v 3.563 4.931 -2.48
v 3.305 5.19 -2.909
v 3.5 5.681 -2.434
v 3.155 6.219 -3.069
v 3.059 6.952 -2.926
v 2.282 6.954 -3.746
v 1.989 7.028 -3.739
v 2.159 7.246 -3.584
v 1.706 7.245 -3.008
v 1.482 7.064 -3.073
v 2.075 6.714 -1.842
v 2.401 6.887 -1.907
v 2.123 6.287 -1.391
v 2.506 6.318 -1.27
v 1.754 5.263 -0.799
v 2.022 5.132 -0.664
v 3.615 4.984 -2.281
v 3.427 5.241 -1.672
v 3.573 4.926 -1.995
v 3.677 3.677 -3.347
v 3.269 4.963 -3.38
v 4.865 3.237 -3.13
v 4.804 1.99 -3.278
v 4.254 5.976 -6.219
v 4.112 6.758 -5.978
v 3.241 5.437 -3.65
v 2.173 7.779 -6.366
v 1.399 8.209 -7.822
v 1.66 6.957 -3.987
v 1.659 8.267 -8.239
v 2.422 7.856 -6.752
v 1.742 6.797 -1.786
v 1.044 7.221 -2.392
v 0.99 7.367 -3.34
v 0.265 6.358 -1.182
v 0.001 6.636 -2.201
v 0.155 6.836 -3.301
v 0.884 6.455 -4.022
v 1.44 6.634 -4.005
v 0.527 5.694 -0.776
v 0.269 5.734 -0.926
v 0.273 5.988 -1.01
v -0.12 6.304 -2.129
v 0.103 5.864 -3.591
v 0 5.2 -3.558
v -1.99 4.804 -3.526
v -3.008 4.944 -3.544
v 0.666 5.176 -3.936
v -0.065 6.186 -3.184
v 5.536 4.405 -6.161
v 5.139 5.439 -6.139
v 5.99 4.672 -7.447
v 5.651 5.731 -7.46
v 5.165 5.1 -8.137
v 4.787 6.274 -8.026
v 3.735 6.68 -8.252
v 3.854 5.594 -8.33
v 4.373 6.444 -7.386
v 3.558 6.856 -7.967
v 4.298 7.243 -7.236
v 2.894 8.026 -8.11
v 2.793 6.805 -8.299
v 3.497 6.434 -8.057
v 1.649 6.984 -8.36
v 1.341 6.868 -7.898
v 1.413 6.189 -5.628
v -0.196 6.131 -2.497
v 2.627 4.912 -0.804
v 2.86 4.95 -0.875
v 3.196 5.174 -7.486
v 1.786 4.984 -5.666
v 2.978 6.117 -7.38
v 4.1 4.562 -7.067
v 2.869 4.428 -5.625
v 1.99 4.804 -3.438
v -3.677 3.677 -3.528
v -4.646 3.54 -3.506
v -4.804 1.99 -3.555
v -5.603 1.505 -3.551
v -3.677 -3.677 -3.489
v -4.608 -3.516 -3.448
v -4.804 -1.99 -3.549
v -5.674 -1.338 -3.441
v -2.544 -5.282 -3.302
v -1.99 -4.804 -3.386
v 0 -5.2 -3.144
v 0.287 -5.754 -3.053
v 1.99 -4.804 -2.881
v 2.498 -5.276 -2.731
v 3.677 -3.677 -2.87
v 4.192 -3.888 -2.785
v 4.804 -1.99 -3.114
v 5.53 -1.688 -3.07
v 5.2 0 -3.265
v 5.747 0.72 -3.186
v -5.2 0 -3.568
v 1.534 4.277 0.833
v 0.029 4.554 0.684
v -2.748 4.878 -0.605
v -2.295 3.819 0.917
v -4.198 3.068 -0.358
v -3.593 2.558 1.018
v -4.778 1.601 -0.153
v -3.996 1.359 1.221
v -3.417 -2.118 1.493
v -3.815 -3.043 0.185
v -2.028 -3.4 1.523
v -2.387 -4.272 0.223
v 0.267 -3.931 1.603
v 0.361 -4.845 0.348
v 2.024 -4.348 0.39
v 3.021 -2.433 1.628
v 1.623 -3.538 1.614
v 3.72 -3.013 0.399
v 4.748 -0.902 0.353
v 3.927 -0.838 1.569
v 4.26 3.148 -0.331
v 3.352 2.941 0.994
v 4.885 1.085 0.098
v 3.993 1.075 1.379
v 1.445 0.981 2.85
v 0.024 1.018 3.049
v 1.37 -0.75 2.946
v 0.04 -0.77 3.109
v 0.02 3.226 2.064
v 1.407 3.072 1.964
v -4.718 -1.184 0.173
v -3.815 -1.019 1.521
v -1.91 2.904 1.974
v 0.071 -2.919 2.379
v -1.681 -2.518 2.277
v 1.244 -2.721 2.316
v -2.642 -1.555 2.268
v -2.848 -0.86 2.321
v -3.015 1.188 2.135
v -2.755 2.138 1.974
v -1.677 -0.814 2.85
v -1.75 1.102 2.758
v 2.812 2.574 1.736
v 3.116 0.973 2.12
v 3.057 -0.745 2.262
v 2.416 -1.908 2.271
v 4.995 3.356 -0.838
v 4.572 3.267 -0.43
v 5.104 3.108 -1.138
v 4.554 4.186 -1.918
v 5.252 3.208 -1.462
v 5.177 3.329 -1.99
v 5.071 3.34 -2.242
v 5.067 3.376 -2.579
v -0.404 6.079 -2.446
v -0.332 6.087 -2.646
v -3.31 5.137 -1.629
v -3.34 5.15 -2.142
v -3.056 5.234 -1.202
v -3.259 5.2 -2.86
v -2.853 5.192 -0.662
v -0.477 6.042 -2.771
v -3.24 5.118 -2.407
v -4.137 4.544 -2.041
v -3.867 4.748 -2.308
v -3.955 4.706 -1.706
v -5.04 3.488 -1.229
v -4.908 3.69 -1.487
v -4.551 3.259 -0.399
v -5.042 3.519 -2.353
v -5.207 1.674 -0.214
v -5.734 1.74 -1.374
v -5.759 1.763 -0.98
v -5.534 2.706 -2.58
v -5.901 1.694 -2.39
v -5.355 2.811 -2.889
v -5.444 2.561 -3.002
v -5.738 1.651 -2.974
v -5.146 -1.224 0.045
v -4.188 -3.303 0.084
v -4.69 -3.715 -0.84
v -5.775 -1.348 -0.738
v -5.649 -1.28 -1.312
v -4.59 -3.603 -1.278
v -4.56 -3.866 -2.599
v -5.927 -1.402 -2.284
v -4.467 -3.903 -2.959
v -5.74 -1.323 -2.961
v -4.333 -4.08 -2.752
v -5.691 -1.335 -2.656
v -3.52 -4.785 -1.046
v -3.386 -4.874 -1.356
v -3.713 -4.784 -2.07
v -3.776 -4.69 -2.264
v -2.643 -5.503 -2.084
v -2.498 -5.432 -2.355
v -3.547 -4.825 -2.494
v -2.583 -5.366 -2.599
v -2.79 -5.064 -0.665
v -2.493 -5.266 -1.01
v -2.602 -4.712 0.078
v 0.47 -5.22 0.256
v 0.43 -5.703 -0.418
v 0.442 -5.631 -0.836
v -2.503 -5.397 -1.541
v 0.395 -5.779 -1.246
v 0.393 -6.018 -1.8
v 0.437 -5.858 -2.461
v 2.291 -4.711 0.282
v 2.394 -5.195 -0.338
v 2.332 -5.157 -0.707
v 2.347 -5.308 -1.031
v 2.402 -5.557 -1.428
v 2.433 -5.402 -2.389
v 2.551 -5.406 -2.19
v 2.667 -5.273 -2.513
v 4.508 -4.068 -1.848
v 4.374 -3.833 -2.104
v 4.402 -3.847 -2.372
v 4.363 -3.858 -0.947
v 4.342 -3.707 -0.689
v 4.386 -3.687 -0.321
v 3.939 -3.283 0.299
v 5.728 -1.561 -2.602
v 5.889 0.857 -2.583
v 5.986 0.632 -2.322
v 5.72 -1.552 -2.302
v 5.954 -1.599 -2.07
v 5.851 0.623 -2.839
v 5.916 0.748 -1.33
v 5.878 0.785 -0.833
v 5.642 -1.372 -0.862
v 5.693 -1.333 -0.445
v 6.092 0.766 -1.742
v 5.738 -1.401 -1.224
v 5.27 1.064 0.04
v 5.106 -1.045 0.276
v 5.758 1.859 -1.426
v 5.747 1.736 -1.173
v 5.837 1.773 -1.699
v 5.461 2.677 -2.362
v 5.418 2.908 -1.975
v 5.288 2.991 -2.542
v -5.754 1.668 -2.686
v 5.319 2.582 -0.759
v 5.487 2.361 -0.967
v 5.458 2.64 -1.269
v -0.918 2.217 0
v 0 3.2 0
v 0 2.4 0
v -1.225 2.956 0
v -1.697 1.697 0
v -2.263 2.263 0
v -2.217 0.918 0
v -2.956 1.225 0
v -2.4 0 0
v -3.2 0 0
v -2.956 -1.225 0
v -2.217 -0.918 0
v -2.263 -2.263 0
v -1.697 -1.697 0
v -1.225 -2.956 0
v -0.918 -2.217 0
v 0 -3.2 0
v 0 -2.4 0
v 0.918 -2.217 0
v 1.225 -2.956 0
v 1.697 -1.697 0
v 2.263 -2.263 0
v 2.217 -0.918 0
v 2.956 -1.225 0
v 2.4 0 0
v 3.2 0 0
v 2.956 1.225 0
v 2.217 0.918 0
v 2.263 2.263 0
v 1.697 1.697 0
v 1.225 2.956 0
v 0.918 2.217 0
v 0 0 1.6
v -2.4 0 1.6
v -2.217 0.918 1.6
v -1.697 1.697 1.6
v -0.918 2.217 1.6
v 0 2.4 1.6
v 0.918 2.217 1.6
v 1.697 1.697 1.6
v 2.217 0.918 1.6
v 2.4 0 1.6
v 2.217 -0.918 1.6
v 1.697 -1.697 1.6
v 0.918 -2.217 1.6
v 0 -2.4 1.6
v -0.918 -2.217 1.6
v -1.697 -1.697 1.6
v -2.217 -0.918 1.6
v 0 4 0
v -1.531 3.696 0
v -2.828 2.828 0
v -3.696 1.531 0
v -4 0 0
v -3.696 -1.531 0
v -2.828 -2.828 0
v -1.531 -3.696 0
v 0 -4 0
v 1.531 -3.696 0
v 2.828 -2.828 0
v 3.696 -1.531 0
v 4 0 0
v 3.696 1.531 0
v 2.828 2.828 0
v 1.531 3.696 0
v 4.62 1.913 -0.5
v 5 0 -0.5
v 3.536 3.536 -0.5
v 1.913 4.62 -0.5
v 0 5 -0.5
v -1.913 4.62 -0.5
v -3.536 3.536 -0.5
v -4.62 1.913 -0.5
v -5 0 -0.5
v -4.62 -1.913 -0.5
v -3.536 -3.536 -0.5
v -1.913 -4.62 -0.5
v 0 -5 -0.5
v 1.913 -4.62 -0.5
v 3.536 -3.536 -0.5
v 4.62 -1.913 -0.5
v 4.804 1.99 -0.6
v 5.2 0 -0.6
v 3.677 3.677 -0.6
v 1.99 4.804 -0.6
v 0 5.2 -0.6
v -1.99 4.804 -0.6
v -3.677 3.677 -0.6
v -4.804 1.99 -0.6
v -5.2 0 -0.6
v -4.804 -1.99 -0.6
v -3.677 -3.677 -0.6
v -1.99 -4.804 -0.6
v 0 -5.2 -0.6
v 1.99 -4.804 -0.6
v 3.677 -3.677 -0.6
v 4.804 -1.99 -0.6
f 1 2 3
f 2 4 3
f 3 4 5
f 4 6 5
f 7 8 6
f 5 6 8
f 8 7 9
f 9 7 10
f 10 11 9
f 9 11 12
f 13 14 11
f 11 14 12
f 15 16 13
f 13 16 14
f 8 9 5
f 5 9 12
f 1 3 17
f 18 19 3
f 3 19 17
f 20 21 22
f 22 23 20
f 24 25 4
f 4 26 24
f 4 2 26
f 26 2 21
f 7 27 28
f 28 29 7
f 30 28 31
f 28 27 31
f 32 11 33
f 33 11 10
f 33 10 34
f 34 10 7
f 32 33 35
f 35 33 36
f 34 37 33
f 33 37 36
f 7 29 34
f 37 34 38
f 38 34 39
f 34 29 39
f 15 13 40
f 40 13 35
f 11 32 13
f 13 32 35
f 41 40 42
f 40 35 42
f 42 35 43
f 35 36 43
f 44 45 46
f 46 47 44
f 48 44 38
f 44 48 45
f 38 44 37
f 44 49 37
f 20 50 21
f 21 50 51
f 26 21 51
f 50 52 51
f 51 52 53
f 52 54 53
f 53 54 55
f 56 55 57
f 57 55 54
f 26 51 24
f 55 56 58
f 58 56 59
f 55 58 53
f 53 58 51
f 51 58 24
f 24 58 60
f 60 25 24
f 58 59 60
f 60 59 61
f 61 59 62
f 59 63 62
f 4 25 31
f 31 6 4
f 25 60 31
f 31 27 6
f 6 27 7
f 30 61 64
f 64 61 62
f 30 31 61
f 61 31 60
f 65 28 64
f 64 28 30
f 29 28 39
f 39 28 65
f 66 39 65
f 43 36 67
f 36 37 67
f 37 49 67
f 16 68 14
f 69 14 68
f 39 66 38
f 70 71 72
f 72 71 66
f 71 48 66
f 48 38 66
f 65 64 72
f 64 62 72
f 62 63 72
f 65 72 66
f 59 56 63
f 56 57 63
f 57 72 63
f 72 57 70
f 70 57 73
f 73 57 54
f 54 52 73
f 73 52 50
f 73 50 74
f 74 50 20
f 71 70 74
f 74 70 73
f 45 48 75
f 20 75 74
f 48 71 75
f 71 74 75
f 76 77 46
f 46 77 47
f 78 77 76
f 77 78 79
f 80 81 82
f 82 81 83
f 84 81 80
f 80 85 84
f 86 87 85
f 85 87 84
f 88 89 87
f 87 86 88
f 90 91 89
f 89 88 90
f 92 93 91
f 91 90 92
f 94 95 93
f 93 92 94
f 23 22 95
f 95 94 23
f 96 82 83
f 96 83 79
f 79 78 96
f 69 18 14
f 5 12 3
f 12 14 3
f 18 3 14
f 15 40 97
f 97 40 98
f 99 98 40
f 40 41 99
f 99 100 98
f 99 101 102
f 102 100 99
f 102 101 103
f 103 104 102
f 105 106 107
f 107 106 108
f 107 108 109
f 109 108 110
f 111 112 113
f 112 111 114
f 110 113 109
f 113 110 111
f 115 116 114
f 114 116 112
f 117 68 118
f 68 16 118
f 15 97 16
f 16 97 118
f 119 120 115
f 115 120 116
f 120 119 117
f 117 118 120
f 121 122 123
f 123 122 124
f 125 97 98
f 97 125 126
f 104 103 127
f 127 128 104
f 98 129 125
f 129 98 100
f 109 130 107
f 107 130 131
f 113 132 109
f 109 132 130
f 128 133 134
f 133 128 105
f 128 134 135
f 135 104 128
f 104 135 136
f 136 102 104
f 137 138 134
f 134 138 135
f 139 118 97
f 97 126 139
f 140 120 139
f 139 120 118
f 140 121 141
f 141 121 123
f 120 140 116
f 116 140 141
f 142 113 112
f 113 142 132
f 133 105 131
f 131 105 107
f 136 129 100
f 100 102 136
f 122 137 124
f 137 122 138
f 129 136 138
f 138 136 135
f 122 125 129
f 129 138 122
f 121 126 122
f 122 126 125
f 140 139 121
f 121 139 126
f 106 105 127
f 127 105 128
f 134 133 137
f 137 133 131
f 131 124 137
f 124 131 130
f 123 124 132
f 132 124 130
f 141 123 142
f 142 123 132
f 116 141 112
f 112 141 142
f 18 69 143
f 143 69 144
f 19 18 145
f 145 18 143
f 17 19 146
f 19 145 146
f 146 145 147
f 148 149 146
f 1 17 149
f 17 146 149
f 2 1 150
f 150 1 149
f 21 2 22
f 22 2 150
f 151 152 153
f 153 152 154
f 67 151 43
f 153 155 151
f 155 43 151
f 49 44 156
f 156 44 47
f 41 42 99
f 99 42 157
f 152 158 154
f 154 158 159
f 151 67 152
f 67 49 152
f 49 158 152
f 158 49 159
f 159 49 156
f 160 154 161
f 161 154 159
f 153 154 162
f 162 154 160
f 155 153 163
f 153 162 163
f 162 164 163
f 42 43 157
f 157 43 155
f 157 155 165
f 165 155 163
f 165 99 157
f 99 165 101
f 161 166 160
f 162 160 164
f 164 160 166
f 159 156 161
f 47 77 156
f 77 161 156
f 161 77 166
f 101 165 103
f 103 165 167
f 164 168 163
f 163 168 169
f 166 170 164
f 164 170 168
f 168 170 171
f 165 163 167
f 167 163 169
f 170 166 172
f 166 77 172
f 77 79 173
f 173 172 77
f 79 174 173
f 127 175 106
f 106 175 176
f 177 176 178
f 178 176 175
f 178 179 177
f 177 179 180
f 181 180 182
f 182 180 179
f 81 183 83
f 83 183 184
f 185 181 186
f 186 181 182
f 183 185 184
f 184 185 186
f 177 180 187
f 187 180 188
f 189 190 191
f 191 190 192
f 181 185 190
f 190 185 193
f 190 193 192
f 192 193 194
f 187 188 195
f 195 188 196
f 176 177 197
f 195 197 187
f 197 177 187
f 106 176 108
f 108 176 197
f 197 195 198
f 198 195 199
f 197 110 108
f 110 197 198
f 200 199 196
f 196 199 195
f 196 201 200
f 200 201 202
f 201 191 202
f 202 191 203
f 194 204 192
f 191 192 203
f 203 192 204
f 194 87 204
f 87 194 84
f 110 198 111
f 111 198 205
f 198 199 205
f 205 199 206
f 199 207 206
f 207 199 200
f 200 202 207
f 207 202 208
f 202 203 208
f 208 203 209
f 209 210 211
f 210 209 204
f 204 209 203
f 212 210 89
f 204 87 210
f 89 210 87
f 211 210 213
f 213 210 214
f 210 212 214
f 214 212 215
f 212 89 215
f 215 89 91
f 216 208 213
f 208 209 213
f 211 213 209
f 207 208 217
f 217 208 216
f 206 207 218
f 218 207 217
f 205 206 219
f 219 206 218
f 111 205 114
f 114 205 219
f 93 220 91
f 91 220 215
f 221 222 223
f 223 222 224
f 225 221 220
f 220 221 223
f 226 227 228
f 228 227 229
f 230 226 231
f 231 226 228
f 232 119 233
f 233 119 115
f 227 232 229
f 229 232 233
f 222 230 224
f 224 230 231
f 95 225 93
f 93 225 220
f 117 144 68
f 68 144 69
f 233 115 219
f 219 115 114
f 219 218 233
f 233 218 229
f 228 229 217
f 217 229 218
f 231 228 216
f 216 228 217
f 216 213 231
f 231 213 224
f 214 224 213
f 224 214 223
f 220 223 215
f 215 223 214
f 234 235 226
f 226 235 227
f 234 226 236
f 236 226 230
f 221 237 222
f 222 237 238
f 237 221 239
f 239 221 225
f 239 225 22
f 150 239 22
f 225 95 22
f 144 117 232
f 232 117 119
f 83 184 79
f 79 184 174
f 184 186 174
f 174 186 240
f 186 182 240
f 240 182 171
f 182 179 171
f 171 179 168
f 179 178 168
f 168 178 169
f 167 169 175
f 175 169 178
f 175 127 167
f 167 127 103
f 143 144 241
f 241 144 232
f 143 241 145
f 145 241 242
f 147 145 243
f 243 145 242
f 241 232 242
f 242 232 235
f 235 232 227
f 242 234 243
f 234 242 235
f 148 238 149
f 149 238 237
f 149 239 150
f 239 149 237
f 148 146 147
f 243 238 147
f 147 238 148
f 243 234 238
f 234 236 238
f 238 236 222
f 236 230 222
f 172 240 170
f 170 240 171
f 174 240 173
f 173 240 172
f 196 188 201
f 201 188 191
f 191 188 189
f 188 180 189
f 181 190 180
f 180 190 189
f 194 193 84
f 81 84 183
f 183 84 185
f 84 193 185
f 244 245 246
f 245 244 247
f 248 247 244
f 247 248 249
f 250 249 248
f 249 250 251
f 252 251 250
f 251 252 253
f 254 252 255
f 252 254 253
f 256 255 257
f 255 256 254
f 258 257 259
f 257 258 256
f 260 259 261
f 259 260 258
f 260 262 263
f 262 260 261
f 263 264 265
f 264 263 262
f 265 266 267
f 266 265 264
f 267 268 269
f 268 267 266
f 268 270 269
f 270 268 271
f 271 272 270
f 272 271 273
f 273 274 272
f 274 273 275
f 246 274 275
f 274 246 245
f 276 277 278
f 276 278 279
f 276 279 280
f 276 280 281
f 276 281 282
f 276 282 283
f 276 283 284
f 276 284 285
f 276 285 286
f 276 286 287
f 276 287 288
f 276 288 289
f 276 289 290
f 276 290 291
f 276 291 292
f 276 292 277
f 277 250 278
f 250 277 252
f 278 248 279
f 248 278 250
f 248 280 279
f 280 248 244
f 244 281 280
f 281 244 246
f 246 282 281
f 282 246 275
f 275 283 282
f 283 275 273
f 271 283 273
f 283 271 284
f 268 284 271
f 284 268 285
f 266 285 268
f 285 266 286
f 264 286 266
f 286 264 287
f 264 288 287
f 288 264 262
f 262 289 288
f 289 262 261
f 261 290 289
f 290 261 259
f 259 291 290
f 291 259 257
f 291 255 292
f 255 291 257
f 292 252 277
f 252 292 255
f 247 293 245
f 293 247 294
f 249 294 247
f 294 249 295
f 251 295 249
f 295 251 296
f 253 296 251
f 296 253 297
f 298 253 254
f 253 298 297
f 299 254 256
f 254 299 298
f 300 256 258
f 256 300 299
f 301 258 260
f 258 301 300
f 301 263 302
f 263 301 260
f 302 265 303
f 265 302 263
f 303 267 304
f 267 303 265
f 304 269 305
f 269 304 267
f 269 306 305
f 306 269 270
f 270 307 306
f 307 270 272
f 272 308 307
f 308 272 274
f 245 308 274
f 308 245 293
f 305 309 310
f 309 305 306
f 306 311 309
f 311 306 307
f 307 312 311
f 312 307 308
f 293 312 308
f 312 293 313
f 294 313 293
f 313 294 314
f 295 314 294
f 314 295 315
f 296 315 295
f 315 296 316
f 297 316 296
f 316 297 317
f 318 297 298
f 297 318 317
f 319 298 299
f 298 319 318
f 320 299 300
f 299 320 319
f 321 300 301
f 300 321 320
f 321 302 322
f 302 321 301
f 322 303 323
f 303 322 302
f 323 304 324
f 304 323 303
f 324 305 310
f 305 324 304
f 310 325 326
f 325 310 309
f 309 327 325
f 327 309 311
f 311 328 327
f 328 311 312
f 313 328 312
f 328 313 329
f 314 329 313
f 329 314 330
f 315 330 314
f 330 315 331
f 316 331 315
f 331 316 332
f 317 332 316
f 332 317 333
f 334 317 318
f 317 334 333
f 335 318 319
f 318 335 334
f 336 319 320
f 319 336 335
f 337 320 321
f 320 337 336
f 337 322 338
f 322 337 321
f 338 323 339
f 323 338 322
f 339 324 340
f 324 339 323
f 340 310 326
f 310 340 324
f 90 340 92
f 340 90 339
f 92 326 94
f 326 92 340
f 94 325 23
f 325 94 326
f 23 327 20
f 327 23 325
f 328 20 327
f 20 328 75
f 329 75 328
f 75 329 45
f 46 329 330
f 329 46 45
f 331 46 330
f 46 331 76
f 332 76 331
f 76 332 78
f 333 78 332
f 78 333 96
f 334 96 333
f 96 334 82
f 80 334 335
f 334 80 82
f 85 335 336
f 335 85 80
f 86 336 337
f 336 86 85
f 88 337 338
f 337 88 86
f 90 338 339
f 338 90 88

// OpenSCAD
use <../lib.scad>
use <s/25973s01.scad>
use <s/25973s02.scad>
use <s/25973s03.scad>
use <s/25973s04.scad>
function ldraw_lib__25973p01() = [
// 0 Minifig Headdress Bald Head with Tied Red Bandana Pattern
// 0 Name: 25973p01.dat
// 0 Author: Lisa Winter [LisaWinter]
// 0 !LDRAW_ORG Part UPDATE 2026-07
// 0 !LICENSE Licensed under CC BY 4.0 : see CAreadme.txt
// 
// 0 BFC CERTIFY CCW
  [0,"BFC","CERTIFY"],
  [0,"BFC","CCW"],
// 
// 0 !CATEGORY Minifig Headwear
// 0 !KEYWORDS Bricklink 25973pb01, Brickowl 146343, Brickset 27991, CMF
// 0 !KEYWORDS Collectible Minifigures, Rebrickable 25973pr0022, Scallywag Pirate
// 0 !KEYWORDS Series 16, Set 71013
// 
// 0 !HISTORY 2026-07-30 [OrionP] Official Update 2026-07
// 
// 0 // Bandana
// 1 4 0 0 0 1 0 0 0 1 0 0 0 1 s\25973s01.dat
  [1,4,0,0,0,1,0,0,0,1,0,0,0,1, ldraw_lib__s__25973s01()],
// 
// 0 // Bald head
// 1 16 0 0 0 1 0 0 0 1 0 0 0 1 s\25973s02.dat
  [1,16,0,0,0,1,0,0,0,1,0,0,0,1, ldraw_lib__s__25973s02()],
// 
// 0 // Patternable area
// 1 4 0 0 0 1 0 0 0 1 0 0 0 1 s\25973s03.dat
  [1,4,0,0,0,1,0,0,0,1,0,0,0,1, ldraw_lib__s__25973s03()],
// 
// 0 // Inside
// 1 16 0 0 0 1 0 0 0 1 0 0 0 1 s\25973s04.dat
  [1,16,0,0,0,1,0,0,0,1,0,0,0,1, ldraw_lib__s__25973s04()],
];
module ldraw_lib__25973p01(step=0, col=false, unit=2/5, alt=false, line=0.2, solid=!$preview)
    makepoly(ldraw_lib__25973p01(), step=step, col=col, unit=unit, alt=alt, line=line, solid=solid);
ldraw_lib__25973p01(line=0.2);
